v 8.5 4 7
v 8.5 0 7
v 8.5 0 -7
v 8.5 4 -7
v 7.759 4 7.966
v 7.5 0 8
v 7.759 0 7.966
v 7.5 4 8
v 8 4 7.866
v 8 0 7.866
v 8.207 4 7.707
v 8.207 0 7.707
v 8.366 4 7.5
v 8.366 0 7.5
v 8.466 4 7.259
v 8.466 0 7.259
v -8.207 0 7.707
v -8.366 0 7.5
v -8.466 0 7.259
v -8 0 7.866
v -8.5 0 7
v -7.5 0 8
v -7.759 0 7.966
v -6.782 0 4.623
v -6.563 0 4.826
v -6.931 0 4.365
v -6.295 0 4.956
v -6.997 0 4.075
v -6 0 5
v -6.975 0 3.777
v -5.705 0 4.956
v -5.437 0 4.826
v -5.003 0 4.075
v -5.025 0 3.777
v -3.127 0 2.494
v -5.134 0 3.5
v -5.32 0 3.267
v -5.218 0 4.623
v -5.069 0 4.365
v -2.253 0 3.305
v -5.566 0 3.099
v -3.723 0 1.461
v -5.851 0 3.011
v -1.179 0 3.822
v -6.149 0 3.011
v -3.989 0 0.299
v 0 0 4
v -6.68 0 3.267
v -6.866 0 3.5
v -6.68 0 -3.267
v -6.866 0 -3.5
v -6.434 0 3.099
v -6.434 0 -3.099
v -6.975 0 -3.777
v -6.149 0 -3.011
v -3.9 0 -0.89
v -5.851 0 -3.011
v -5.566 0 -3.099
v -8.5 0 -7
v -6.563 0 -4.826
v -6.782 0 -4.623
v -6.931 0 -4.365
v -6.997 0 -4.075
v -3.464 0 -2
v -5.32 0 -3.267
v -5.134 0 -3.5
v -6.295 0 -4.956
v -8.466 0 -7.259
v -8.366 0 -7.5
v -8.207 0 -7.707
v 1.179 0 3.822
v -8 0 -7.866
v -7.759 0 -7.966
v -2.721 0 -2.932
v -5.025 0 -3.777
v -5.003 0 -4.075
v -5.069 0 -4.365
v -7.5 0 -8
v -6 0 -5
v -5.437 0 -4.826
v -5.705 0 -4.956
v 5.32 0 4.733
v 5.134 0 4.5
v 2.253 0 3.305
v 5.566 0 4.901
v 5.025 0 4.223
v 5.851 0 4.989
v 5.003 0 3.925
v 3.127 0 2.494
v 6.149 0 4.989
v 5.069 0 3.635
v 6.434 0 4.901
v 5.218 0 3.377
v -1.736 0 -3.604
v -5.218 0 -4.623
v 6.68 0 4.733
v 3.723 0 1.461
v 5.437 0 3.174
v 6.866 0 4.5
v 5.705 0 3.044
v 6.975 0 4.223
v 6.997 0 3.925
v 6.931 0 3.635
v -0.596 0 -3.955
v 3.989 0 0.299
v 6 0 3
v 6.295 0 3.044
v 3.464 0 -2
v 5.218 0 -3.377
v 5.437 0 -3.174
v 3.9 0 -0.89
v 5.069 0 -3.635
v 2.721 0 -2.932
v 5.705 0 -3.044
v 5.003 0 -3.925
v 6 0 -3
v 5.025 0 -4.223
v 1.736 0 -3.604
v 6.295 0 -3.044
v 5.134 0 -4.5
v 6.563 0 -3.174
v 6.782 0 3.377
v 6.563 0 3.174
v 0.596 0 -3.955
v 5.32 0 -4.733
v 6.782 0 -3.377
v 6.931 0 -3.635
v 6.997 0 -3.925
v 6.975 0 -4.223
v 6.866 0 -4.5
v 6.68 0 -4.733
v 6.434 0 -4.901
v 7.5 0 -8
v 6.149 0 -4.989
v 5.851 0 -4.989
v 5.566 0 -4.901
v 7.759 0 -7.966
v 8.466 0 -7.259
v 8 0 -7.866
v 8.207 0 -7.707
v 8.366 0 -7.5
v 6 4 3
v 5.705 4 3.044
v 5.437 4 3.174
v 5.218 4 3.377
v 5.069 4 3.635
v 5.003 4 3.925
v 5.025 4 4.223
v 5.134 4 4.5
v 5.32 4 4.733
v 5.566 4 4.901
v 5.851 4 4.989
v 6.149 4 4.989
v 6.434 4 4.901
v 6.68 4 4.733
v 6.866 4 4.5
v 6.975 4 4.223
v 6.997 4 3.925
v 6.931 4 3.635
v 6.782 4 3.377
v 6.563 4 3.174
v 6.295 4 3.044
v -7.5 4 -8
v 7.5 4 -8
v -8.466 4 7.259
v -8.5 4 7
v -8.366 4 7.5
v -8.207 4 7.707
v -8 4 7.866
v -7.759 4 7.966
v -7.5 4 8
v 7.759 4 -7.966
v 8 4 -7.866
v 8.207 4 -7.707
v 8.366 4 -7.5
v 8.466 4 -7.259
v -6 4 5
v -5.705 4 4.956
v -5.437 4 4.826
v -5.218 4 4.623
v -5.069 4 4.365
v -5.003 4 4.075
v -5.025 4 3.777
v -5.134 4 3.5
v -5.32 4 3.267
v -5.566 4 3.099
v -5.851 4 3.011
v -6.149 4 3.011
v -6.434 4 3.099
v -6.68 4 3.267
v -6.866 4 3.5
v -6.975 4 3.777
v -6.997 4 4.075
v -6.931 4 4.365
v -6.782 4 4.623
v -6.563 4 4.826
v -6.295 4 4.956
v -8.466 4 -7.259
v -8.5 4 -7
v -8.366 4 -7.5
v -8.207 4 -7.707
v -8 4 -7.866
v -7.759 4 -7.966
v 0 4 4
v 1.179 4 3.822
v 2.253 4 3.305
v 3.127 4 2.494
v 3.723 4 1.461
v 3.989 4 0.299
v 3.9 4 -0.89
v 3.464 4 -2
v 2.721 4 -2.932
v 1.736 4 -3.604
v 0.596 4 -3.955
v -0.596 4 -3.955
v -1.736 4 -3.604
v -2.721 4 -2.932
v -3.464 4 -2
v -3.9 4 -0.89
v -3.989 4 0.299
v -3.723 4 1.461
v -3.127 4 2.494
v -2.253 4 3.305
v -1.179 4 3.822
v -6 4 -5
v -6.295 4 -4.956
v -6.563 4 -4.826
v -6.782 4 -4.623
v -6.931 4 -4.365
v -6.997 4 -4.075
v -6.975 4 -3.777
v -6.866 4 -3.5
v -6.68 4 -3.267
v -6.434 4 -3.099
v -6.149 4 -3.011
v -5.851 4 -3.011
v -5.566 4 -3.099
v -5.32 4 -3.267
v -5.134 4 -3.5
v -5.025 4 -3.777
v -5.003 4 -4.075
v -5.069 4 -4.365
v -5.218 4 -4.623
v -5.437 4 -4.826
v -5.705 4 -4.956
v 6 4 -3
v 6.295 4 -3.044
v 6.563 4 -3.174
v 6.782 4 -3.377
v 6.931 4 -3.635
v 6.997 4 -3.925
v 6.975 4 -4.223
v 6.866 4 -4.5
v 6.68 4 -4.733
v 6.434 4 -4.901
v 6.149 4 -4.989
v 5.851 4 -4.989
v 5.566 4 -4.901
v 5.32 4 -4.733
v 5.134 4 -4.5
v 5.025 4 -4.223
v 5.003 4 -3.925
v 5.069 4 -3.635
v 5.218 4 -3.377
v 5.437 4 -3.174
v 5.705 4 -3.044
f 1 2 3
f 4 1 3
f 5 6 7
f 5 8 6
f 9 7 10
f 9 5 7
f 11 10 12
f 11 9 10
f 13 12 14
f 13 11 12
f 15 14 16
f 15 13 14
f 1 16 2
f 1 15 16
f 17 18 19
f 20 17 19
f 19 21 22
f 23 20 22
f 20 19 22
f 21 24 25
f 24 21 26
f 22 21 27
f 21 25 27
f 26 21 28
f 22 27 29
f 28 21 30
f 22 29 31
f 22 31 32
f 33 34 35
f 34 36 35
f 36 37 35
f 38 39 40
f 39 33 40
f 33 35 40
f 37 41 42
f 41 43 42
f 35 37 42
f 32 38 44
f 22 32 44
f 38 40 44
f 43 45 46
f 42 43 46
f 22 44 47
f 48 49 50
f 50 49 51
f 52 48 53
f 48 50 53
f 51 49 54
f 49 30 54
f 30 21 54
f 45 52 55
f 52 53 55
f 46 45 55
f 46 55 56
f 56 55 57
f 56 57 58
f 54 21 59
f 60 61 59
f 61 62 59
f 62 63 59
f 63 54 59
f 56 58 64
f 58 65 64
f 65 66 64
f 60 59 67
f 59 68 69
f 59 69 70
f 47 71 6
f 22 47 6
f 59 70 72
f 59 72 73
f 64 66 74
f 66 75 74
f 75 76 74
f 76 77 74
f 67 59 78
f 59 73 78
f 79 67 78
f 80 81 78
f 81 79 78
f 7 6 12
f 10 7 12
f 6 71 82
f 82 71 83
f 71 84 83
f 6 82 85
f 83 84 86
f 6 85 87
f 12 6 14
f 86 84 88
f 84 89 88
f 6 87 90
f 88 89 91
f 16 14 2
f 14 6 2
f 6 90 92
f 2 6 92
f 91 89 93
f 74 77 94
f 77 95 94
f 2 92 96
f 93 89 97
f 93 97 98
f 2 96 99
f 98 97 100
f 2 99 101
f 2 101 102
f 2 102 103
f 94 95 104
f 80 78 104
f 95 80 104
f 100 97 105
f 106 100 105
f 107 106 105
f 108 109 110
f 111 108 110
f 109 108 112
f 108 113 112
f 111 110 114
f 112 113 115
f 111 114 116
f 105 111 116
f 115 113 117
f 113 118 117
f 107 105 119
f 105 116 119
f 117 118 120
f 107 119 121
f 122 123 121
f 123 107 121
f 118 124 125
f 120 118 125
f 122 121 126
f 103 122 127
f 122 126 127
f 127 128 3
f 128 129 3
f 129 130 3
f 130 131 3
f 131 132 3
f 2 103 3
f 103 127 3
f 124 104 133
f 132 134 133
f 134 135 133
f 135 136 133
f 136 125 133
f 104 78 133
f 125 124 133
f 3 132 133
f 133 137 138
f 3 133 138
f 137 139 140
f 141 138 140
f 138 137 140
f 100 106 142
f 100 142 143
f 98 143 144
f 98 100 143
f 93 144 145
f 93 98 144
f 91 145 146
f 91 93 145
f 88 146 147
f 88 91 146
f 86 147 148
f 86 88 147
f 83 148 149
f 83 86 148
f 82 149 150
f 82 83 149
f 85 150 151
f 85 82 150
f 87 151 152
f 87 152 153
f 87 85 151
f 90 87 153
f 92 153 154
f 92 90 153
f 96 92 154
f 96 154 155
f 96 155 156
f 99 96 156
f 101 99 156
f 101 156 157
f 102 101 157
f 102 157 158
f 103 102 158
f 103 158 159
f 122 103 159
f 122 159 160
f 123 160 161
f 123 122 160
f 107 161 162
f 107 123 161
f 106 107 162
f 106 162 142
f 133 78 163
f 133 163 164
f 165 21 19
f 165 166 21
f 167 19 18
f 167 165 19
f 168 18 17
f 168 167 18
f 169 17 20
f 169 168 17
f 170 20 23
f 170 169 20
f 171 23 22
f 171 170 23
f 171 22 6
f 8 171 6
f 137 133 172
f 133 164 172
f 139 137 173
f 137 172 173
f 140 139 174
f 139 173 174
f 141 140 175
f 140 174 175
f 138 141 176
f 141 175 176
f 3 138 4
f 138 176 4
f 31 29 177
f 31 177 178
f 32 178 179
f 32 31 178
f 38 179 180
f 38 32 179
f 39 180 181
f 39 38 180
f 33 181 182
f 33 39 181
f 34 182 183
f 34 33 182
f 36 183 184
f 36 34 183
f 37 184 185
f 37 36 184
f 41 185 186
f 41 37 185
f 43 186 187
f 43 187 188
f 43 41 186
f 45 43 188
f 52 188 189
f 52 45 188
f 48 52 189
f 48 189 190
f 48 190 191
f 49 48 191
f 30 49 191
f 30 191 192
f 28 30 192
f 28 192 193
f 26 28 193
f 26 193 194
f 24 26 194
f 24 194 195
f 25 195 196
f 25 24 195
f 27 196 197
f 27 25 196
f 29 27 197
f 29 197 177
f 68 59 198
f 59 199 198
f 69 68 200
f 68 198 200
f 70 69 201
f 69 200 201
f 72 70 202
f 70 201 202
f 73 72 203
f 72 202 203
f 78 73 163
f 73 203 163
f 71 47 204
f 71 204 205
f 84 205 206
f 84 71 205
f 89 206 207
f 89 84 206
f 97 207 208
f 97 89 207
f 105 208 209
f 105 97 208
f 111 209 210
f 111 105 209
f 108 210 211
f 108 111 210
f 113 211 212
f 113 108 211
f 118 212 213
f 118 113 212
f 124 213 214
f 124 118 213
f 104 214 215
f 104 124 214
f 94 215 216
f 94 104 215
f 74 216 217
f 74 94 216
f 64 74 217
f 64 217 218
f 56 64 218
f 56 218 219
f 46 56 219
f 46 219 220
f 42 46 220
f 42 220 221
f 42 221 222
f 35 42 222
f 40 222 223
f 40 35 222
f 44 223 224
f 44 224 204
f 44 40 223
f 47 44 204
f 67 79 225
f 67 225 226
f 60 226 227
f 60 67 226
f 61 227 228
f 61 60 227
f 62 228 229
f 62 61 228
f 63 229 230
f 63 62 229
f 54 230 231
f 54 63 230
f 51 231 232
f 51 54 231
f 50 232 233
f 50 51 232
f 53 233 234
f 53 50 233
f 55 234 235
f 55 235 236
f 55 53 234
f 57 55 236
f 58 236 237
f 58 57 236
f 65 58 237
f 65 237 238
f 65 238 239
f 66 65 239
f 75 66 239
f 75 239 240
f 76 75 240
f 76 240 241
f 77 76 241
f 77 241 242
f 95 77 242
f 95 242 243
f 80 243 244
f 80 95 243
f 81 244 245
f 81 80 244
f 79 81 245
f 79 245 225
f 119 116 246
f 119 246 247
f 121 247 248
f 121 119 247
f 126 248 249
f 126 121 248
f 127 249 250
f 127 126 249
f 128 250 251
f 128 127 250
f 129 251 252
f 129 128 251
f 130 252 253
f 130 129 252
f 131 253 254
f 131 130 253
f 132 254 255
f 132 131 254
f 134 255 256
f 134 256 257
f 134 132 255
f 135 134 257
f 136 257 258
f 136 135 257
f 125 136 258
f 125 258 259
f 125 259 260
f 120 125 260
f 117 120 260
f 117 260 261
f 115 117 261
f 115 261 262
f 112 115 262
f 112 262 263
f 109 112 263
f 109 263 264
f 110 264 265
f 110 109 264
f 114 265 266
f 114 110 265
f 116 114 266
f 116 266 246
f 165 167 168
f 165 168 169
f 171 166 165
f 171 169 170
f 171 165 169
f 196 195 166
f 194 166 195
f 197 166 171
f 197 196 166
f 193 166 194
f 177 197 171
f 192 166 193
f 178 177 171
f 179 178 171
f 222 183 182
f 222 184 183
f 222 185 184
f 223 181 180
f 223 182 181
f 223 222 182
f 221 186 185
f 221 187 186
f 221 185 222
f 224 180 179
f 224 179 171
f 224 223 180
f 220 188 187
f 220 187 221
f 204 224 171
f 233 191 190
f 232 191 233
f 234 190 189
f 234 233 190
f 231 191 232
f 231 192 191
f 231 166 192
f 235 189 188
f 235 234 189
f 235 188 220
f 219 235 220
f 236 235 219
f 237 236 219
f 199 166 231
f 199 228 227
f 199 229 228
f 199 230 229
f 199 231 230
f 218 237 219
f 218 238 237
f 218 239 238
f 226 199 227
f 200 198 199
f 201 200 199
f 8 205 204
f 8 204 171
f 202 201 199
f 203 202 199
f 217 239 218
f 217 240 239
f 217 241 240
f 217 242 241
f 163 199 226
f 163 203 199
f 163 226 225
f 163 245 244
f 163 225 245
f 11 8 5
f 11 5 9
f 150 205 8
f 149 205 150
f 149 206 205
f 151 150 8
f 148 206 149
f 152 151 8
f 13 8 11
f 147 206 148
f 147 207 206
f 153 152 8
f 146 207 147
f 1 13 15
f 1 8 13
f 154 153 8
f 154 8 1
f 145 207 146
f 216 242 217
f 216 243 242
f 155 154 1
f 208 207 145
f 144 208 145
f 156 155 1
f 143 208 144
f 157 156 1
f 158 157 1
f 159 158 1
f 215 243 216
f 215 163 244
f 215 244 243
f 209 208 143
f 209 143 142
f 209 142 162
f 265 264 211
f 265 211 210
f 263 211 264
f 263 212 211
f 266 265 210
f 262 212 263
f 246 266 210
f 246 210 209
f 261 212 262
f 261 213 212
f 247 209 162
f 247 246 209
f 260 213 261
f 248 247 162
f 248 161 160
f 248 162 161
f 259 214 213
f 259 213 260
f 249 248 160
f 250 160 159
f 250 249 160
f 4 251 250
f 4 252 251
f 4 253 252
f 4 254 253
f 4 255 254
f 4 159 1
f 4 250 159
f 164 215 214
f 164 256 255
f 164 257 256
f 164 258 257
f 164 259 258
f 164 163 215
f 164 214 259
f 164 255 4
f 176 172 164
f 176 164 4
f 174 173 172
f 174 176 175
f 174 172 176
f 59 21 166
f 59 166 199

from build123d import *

# Parameters (mm, degrees)
SKETCH_1_W      = 17
SKETCH_1_H      = 16
SKETCH_1_R      = 1
SKETCH_1_R_2    = 4
EXTRUDE_1_DEPTH = 4
FILLET_1_R      = 1


with BuildPart() as part:
    # 草图1 → 凸台-拉伸1 (new body)
    with BuildSketch(Plane(origin=(0, 0, 0), x_dir=(1, 0, 0), z_dir=(0, 1, 0))):
        Rectangle(SKETCH_1_W, SKETCH_1_H)
        with Locations(Location((6, 4, 0), (0, 0, 270))):
            Circle(SKETCH_1_R, mode=Mode.SUBTRACT)
        with Locations(Location((-6, 4, 0), (0, 0, 90))):
            Circle(SKETCH_1_R, mode=Mode.SUBTRACT)
        with Locations(Location((6, -4, 0), (0, 0, 90))):
            Circle(SKETCH_1_R, mode=Mode.SUBTRACT)
        with Locations(Location((-6, -4, 0), (0, 0, 270))):
            Circle(SKETCH_1_R, mode=Mode.SUBTRACT)
        with Locations(Location((0, 0, 0), (0, 0, 270))):
            Circle(SKETCH_1_R_2, mode=Mode.SUBTRACT)
    extrude(amount=EXTRUDE_1_DEPTH)

    # 圆角1
    fillet_1_edges = [part.edges().sort_by_distance(p)[0] for p in [
        (8.5, 2, 8),
        (-8.5, 2, 8),
        (-8.5, 2, -8),
        (8.5, 2, -8),
    ]]
    fillet(fillet_1_edges, radius=FILLET_1_R)


solid = part.part
